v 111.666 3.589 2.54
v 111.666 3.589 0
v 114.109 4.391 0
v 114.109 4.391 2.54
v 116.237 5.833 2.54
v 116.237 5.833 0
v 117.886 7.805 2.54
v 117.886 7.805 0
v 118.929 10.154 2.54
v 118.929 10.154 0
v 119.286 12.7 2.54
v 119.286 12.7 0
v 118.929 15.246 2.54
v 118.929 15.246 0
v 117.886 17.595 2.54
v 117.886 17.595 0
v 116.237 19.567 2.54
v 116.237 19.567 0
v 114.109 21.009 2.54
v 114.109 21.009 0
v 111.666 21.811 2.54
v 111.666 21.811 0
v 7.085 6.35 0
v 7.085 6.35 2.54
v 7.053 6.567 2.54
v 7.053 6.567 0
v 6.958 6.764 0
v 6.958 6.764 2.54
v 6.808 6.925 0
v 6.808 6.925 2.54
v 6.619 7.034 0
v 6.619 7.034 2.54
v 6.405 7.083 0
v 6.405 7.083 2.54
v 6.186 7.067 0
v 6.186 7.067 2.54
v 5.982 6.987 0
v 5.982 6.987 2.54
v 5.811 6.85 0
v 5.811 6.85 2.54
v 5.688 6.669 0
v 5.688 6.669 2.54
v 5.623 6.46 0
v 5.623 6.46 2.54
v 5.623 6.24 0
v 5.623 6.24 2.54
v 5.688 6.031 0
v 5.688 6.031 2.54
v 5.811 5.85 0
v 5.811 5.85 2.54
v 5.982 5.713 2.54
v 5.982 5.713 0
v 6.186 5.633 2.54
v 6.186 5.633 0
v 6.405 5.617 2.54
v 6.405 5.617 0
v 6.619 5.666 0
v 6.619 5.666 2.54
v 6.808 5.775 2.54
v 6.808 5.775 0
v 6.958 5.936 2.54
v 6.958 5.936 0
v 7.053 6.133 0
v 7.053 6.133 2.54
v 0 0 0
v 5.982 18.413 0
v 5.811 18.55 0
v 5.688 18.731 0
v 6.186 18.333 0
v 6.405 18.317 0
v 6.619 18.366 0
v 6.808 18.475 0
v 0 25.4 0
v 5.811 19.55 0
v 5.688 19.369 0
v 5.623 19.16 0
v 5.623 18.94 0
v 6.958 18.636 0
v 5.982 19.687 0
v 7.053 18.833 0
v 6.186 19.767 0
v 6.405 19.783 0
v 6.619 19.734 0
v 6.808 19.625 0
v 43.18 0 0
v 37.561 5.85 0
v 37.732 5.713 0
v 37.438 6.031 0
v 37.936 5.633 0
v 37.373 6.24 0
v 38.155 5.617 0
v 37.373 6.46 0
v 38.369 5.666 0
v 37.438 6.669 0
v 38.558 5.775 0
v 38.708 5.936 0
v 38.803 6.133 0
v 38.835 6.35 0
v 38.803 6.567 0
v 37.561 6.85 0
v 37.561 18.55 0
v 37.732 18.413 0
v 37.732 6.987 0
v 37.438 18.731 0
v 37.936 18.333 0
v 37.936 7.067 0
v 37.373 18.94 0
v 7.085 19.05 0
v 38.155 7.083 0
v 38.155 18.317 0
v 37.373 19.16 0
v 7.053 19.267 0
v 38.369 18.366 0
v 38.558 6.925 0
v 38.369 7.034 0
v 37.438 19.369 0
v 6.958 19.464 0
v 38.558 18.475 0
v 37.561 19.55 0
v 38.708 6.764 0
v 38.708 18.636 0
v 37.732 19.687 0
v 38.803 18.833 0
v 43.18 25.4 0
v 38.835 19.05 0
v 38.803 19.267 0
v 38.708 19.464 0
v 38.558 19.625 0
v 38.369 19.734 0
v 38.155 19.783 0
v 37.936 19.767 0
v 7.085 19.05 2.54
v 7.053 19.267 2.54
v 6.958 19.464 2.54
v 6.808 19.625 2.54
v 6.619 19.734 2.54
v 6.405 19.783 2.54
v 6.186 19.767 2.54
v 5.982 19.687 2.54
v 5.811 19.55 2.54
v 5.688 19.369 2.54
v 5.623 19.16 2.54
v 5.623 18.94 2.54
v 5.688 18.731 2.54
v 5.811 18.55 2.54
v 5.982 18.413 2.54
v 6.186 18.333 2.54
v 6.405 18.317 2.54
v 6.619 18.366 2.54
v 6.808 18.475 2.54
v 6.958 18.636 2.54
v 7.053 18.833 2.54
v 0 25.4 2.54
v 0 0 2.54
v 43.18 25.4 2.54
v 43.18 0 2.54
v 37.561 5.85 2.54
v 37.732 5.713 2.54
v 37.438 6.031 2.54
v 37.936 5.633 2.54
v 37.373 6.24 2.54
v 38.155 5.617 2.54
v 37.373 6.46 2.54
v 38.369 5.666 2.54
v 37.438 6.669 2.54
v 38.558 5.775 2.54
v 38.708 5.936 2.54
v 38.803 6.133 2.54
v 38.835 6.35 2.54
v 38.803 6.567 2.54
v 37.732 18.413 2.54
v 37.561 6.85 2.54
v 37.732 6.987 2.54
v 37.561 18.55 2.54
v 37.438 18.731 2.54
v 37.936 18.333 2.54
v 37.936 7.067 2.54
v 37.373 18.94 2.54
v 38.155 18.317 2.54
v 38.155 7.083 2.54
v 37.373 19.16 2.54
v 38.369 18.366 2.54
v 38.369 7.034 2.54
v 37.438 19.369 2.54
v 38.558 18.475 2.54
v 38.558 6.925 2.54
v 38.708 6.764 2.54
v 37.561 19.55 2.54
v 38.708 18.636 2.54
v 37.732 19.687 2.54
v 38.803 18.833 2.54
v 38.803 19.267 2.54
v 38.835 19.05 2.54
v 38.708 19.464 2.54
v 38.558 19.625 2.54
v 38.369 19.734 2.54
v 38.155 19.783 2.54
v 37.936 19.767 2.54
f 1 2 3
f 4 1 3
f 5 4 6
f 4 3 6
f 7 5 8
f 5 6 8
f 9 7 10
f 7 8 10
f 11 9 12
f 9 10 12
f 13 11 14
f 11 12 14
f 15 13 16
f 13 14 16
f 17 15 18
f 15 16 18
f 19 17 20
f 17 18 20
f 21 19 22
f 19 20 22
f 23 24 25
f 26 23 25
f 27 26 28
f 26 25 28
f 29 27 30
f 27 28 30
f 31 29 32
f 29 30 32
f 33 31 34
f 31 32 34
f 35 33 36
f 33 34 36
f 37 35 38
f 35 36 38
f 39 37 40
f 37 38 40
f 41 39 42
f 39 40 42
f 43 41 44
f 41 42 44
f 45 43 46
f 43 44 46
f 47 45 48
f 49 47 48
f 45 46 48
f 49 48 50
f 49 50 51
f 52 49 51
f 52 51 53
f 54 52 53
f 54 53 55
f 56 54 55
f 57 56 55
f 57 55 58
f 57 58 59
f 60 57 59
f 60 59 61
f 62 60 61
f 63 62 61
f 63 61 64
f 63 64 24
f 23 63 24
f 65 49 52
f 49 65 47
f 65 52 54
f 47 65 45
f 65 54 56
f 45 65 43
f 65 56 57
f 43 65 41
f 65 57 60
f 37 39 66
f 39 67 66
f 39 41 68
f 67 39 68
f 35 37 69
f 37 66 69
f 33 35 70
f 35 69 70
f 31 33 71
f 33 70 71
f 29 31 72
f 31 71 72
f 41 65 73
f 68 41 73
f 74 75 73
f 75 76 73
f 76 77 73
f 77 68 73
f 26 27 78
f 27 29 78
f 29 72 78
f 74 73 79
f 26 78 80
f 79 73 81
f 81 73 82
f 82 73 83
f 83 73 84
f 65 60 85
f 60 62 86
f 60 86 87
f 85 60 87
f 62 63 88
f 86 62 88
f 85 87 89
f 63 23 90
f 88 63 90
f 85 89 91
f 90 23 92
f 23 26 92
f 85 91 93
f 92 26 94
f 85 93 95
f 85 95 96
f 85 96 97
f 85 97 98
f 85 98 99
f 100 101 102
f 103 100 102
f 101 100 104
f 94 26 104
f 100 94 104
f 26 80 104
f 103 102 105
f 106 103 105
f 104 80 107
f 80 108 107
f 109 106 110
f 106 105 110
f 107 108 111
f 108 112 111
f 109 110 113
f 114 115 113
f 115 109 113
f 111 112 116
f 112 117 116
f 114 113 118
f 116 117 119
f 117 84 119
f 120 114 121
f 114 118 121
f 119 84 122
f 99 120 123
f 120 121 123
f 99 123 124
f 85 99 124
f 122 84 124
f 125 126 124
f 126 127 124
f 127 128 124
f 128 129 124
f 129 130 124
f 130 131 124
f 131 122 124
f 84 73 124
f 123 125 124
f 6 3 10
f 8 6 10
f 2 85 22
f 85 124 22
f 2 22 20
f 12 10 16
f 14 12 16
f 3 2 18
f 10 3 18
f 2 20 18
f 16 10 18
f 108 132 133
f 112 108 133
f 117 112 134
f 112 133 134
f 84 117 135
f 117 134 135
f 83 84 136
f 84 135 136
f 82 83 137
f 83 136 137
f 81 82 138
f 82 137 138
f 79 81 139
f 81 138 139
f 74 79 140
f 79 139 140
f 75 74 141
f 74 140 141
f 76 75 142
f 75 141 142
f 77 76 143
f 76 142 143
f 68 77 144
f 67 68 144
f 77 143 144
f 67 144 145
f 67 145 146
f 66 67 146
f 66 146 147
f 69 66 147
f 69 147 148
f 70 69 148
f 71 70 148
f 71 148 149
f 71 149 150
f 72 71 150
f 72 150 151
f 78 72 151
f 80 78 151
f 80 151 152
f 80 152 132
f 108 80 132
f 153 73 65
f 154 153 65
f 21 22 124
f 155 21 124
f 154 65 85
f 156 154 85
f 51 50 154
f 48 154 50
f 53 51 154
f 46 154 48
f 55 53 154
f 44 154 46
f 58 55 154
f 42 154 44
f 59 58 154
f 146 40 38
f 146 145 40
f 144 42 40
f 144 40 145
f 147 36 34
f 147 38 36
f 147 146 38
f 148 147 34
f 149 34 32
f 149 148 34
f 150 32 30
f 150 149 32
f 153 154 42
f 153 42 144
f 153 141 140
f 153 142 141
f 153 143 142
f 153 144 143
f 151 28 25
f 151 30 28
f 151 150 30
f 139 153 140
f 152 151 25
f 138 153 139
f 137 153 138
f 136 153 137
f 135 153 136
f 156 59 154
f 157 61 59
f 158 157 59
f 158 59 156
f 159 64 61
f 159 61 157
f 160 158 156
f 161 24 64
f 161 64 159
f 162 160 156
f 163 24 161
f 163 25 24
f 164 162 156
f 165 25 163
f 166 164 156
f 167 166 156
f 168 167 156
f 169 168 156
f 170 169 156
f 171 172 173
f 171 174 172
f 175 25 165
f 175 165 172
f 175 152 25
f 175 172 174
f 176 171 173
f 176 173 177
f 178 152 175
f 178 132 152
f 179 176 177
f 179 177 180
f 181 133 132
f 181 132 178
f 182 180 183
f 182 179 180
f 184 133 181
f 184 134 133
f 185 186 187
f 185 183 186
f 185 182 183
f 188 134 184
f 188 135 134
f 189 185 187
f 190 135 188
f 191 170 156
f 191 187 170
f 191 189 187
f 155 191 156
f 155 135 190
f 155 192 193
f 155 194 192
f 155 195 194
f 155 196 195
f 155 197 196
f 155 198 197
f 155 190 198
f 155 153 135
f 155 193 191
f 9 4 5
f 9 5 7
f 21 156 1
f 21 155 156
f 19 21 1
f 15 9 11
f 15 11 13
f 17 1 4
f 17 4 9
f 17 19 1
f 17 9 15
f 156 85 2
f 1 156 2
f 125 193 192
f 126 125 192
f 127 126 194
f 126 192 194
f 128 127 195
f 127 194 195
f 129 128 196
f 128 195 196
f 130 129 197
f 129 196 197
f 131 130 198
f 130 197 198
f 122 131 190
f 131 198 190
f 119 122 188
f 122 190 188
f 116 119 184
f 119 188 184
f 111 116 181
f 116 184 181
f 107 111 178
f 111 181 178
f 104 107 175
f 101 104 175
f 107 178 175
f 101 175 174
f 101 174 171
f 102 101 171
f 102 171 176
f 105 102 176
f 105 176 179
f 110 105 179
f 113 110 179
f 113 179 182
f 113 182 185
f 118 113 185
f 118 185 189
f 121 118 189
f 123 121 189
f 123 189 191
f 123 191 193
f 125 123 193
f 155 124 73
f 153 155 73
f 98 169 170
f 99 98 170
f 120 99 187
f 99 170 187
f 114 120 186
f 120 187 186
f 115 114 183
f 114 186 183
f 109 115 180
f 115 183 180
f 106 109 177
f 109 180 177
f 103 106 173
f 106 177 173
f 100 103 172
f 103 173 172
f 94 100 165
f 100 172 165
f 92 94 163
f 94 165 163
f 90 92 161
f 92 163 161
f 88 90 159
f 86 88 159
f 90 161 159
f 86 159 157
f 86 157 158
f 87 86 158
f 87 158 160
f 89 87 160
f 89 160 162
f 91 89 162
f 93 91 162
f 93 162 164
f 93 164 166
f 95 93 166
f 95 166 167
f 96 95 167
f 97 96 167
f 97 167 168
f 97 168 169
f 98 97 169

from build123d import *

# Parameters (mm, degrees)
F1_DEPTH = 2.54
F2_R     = 0.73531
F3_DEPTH = 25.4


with BuildPart() as f1:
    # F0 (on Top) → F1 (new body)
    with BuildSketch(Plane.XY):
        with BuildLine():
            Line((0, 25.4), (0, 0))
            Line((0, 0), (43.18, 0))
            Line((43.18, 0), (111.666013, 3.5892))
            ThreePointArc((111.666013, 3.5892), (119.286013, 12.7), (111.666013, 21.8108))
            Line((111.666013, 21.8108), (43.18, 25.4))
            Line((43.18, 25.4), (0, 25.4))
        make_face()
    extrude(amount=F1_DEPTH)

    # F2 (on face) → F3 (cut)
    with BuildSketch(Plane.XY.offset(2.54)):
        with Locations((6.35, 19.05)):
            Circle(F2_R)
        with Locations((6.35, 6.35)):
            Circle(F2_R)
        with Locations((38.1, 6.35)):
            Circle(F2_R)
        with Locations((38.1, 19.05)):
            Circle(F2_R)
    extrude(amount=-F3_DEPTH, mode=Mode.SUBTRACT)


solid = f1.part
